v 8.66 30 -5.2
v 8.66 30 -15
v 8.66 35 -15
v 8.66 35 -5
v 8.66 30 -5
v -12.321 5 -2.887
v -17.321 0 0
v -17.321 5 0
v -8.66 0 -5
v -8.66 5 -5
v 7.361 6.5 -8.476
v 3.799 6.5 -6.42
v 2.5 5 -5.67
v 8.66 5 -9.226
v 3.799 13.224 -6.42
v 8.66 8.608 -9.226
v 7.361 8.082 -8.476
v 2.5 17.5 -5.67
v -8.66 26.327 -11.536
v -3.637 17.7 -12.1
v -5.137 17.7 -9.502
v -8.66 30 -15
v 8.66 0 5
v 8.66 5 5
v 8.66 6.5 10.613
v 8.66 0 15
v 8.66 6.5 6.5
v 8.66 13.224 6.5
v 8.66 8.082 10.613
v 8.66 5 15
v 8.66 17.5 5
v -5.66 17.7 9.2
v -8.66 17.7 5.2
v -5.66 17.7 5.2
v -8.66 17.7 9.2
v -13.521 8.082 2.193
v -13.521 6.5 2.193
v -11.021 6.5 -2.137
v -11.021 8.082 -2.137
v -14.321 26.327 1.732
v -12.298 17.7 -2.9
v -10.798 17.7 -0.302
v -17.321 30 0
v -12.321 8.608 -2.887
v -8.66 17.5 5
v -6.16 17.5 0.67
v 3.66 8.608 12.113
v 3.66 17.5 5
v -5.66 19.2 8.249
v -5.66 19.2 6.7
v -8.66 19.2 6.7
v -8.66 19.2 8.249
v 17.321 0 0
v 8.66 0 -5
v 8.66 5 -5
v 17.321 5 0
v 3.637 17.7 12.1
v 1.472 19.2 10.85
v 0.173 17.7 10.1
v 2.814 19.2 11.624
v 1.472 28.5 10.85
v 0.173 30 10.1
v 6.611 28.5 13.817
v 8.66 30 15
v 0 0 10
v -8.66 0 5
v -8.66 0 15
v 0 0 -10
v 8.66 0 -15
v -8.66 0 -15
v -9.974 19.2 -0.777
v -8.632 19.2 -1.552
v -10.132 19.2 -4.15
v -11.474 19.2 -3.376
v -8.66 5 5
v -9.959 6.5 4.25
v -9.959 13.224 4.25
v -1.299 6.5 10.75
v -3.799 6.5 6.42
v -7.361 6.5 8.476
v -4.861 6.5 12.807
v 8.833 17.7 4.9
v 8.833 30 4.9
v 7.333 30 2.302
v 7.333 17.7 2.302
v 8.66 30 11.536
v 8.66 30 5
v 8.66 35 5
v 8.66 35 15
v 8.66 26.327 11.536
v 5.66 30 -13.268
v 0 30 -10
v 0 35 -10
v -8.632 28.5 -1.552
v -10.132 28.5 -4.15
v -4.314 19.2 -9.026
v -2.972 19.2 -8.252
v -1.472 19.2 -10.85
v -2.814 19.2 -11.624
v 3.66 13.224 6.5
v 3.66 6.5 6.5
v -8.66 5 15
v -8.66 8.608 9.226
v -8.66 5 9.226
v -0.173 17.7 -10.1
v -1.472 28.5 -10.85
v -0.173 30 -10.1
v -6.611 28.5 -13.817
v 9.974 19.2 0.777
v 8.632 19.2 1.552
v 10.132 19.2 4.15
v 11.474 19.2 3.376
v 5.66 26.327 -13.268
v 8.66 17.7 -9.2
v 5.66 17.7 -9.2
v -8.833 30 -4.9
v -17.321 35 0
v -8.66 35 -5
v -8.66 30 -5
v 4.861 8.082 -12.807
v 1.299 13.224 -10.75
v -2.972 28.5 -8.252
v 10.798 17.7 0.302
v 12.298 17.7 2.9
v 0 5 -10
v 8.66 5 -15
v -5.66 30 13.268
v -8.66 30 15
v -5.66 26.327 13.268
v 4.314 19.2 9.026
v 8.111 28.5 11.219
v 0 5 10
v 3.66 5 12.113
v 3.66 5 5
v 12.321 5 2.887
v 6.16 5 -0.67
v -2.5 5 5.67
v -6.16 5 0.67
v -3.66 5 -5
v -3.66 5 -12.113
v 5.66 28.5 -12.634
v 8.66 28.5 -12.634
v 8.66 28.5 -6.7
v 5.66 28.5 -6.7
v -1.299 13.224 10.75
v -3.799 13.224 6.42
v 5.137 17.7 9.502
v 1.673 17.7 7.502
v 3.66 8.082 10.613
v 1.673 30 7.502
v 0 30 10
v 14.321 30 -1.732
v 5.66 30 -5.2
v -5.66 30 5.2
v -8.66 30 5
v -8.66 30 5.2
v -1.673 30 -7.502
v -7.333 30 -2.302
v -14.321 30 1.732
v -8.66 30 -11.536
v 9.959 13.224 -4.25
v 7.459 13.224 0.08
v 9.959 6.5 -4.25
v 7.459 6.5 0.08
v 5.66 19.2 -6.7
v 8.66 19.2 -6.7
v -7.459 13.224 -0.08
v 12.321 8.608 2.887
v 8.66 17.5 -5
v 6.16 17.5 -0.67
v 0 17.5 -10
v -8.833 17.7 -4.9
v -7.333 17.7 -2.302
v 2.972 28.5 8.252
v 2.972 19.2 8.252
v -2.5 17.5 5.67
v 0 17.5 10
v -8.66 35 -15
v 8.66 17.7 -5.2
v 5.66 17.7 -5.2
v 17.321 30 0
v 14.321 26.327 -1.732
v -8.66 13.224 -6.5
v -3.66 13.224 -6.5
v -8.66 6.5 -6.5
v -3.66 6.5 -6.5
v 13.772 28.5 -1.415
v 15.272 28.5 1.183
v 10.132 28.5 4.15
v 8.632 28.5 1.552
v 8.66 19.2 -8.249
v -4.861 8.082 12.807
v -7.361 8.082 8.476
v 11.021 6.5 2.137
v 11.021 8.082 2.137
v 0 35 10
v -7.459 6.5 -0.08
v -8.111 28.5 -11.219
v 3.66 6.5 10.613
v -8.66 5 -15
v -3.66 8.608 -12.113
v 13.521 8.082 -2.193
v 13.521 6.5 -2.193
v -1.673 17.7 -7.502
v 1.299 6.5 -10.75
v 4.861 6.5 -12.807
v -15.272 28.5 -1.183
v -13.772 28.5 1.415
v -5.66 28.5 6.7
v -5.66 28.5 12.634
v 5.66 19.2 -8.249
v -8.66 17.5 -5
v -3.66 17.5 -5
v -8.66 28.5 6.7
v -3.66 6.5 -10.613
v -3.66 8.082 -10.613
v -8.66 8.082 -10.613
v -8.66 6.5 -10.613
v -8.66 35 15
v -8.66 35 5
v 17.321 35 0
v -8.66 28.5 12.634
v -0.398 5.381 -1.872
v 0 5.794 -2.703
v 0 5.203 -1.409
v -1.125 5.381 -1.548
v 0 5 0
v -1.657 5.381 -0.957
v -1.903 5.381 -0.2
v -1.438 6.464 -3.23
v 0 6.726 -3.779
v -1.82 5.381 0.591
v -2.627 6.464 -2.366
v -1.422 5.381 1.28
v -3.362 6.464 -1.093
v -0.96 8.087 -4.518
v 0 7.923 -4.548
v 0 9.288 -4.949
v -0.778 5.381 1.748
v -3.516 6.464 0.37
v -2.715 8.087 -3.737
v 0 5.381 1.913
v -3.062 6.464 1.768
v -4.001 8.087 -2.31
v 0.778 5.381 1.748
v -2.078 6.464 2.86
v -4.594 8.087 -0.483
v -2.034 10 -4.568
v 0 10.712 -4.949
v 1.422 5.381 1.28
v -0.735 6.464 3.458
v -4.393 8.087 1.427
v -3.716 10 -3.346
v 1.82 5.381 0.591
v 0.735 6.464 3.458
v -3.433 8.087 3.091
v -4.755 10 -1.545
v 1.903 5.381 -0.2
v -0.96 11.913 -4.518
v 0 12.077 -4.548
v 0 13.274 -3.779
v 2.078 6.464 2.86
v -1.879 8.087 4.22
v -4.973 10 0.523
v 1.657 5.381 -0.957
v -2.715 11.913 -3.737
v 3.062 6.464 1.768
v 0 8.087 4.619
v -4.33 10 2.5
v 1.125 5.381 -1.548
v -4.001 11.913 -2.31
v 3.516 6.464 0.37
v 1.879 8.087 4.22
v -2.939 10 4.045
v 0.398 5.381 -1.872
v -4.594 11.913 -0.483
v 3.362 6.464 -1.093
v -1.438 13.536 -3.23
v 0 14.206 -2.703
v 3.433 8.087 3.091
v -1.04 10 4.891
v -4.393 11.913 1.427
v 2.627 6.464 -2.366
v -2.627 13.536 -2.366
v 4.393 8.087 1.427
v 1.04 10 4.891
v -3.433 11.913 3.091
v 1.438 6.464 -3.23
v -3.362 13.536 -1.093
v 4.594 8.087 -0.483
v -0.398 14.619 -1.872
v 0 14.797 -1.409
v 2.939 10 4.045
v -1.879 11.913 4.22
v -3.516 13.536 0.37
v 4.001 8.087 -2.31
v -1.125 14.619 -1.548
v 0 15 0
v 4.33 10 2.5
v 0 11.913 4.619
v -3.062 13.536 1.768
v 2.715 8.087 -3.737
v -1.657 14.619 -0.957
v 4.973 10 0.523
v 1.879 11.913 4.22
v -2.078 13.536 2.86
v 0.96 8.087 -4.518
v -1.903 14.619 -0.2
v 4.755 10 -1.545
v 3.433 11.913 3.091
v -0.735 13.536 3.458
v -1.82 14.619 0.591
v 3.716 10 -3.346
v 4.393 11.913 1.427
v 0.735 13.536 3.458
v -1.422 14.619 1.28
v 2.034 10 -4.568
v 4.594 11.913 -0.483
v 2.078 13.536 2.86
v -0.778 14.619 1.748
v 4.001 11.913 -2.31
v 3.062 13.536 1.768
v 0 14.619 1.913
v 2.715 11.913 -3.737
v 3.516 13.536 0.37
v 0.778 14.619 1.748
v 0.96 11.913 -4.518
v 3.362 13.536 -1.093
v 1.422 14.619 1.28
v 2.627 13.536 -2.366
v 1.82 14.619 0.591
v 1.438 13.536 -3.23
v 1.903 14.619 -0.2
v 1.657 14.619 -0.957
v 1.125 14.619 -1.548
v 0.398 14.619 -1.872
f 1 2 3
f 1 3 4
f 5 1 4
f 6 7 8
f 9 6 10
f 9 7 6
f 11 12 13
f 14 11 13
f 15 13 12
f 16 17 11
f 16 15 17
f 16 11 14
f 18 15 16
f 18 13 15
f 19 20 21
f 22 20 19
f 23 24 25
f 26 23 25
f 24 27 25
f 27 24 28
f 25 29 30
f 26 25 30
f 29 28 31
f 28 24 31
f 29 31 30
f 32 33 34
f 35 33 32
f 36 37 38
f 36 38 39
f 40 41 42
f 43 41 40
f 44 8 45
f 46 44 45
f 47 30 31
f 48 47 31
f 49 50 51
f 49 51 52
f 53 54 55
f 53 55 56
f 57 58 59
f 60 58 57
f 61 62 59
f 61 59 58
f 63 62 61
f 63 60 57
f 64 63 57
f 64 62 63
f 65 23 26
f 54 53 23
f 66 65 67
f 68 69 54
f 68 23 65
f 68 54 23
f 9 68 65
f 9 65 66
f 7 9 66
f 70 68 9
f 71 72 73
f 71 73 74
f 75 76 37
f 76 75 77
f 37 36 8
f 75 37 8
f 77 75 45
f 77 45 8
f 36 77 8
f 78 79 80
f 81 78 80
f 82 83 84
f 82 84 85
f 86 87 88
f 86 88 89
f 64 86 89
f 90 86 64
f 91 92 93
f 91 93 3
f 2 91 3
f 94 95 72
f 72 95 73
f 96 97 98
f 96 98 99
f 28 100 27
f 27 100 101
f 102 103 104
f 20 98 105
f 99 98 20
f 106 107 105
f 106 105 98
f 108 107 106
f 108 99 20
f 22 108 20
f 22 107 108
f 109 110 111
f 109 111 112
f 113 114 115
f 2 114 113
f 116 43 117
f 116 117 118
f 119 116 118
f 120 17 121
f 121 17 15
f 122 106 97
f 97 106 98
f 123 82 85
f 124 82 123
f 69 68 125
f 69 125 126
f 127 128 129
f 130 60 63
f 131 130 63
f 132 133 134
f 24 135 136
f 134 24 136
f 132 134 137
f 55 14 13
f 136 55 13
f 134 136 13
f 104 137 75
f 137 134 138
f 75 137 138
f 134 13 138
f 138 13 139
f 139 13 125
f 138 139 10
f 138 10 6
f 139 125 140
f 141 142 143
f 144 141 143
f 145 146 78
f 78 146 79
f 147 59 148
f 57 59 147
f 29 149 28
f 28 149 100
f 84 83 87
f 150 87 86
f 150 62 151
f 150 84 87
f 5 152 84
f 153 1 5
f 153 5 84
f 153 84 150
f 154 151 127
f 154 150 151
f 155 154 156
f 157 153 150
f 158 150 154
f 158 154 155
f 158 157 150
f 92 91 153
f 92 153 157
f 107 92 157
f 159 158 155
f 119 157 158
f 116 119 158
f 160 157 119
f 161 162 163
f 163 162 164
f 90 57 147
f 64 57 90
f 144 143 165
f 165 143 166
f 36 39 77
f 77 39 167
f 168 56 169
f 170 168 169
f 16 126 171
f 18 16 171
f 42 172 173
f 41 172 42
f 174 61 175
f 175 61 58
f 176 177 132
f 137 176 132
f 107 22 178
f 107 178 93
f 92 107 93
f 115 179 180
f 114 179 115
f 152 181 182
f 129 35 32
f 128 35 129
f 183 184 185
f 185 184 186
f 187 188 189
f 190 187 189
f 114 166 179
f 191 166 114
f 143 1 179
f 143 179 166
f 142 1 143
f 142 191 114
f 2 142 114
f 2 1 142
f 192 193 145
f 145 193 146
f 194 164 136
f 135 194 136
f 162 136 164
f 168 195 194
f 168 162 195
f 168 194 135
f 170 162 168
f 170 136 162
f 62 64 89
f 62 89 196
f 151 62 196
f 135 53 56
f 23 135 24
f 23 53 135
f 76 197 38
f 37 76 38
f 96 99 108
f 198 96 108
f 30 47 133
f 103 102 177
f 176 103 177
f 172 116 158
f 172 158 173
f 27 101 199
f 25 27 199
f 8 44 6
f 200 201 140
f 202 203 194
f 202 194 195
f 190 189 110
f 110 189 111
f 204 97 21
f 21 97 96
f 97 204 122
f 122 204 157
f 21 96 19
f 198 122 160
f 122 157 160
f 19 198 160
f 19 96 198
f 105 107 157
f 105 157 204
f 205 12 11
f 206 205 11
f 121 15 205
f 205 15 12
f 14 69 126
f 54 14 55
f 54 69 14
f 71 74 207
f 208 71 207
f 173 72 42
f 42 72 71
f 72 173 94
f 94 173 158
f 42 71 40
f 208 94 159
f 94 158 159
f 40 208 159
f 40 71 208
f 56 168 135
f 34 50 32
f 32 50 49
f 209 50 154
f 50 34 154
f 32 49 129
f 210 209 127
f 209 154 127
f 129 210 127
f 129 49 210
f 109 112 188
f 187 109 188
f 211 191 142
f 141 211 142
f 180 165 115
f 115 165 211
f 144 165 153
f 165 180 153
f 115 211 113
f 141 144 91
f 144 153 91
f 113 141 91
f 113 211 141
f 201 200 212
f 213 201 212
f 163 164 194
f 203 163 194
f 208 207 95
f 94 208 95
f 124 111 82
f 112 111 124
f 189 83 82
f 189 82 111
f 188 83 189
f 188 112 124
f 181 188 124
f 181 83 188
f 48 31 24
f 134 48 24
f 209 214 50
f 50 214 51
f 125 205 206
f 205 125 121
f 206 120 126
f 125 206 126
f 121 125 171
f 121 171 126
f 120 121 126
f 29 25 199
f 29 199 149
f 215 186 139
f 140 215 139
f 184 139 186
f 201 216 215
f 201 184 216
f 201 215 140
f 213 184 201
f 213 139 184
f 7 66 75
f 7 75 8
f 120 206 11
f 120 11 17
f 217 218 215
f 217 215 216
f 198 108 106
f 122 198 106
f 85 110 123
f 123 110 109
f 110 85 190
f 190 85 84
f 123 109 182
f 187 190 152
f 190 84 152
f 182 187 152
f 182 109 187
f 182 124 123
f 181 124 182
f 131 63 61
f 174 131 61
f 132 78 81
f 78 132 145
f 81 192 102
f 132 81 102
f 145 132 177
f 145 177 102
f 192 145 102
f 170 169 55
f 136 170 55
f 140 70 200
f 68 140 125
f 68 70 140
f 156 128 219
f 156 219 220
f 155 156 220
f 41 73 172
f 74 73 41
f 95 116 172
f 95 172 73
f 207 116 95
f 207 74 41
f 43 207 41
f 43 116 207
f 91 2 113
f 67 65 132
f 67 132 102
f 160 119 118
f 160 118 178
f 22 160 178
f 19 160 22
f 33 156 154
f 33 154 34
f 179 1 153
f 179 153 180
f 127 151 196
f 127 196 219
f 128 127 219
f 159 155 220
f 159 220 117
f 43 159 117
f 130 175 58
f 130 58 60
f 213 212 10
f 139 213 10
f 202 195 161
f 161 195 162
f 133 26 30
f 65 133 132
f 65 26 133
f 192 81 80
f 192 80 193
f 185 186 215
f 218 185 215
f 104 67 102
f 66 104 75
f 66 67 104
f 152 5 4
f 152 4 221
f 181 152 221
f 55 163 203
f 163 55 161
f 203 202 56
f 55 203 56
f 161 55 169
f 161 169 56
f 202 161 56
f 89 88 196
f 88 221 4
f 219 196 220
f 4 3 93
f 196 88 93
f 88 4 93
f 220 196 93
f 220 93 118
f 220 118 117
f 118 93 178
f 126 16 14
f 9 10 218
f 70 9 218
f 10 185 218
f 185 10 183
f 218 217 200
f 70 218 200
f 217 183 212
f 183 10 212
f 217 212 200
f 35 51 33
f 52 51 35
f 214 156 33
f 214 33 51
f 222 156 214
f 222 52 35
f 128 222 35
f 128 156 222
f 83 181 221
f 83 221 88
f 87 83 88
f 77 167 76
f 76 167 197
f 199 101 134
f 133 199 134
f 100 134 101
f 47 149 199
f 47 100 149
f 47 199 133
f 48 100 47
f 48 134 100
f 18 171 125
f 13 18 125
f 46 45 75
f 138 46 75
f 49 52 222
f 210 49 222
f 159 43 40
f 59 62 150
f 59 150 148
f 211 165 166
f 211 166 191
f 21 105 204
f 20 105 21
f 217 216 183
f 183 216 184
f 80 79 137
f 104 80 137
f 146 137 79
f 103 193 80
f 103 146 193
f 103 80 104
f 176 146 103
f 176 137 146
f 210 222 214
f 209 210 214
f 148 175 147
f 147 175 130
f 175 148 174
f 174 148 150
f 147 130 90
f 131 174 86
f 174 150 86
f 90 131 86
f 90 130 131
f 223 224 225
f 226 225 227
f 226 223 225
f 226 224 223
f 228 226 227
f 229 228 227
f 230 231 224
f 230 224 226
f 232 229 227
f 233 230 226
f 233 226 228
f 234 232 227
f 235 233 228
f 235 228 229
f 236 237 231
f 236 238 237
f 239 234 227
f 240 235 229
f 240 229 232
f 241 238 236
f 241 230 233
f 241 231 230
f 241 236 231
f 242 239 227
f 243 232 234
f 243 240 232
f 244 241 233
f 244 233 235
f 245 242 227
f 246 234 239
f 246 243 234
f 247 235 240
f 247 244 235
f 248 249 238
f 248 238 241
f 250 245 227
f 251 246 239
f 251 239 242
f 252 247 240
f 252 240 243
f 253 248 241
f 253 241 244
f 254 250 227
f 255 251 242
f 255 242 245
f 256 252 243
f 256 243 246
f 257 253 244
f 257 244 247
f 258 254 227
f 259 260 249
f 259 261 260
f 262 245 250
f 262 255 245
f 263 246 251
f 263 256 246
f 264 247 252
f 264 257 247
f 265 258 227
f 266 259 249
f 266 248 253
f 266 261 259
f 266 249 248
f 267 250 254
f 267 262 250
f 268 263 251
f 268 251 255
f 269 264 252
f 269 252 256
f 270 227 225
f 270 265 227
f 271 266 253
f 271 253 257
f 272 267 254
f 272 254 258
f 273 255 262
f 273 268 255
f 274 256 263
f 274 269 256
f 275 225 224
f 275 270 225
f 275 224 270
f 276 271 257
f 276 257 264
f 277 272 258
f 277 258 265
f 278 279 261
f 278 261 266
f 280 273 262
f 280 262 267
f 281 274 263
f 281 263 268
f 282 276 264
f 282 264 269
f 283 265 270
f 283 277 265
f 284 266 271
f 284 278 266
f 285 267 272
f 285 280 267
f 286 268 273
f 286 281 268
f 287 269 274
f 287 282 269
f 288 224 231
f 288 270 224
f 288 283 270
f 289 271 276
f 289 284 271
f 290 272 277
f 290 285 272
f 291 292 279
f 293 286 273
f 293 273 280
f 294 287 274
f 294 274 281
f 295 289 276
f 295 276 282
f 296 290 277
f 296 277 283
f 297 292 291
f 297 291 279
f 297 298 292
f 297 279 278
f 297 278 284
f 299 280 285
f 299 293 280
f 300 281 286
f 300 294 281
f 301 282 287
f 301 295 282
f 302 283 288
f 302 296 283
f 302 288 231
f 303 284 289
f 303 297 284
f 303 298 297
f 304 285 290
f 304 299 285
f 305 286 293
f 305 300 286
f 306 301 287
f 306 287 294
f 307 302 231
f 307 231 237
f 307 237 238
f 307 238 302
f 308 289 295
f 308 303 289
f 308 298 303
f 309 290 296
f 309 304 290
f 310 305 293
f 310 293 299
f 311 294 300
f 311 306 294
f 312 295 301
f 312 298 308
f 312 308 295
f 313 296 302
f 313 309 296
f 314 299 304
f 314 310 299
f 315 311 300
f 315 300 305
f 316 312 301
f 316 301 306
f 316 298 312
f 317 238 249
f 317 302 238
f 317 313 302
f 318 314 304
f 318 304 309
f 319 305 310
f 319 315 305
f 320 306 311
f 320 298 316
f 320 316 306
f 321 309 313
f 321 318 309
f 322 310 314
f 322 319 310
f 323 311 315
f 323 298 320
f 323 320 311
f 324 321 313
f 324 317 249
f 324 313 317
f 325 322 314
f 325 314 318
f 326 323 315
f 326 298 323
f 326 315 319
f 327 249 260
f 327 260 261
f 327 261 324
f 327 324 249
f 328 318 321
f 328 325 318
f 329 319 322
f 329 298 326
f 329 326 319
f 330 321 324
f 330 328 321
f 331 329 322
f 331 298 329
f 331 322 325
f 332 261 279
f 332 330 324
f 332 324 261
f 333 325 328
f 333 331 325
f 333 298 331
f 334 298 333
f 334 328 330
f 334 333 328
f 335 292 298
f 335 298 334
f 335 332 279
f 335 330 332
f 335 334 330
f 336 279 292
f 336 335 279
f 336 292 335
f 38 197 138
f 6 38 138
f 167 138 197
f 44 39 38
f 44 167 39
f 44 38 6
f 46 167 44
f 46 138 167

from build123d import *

# Parameters (mm, degrees)
BOSS_EXTRUDE1_DEPTH = 5
BOSS_EXTRUDE2_START = 30
BOSS_EXTRUDE2_DEPTH = 5
BOSS_EXTRUDE3_DEPTH = 5
CIRPATTERN3_COUNT   = 6
SKETCH6_W           = 10
SKETCH6_H           = 17.5
CUT_EXTRUDE2_DEPTH  = 5
CIRPATTERN4_COUNT   = 6
CUT_EXTRUDE3_DEPTH  = 5
CIRPATTERN5_COUNT   = 6
BOSS_EXTRUDE4_DEPTH = 3
CIRPATTERN6_COUNT   = 6
SKETCH9_W           = 6.930095711
SKETCH9_H           = 11.997305441
CUT_EXTRUDE4_DEPTH  = 3
CIRPATTERN7_COUNT   = 6


with BuildPart() as part:
    # Sketch2 → Boss-Extrude1 (new body)
    with BuildSketch(Plane(origin=(0, 0, 0), x_dir=(1, 0, 0), z_dir=(0, 1, 0))):
        Polygon((8.660254038, -15), (0, -10), (0, 0), (8.660254038, -5), align=None)
        Polygon((-8.660254038, -15), (-8.660254038, -5), (0, 0), (0, -10), align=None)
        Polygon((-17.320508076, 0), (-8.660254038, 5), (0, 0), (-8.660254038, -5), align=None)
        Polygon((0, 10), (0, 0), (-8.660254038, 5), (-8.660254038, 15), align=None)
        Polygon((8.660254038, 15), (8.660254038, 5), (0, 0), (0, 10), align=None)
        Polygon((17.320508076, 0), (8.660254038, -5), (0, 0), (8.660254038, 5), align=None)
    extrude(amount=BOSS_EXTRUDE1_DEPTH)

    # Sketch3 → Boss-Extrude3 (add)
    with BuildSketch(Plane.ZY.offset(8.660254038)):
        Polygon((-15, 5), (-5, 17.5), (-5, 5), align=None)
    boss_extrude3 = extrude(amount=-BOSS_EXTRUDE3_DEPTH)

    # CirPattern3: Boss-Extrude3 ×6 about axis
    cirpattern3_axis = Axis((0, 0, 0), (0, 1, 0))
    for i in range(1, CIRPATTERN3_COUNT):
        add(boss_extrude3.rotate(cirpattern3_axis, i * 360 / CIRPATTERN3_COUNT))

    # Sketch6 → Cut-Extrude2 (cut)
    with BuildSketch(Plane(origin=(4.330127019, 0, -7.5), x_dir=(-0.866025404, 0, -0.5), z_dir=(0.5, 0, -0.866025404))):
        with Locations((10, 8.75)):
            Rectangle(SKETCH6_W, SKETCH6_H)
    cut_extrude2 = extrude(amount=CUT_EXTRUDE2_DEPTH, mode=Mode.SUBTRACT)

    # CirPattern4: Cut-Extrude2 ×6 about axis
    cirpattern4_axis = Axis((0, 0, 0), (0, 1, 0))
    for i in range(1, CIRPATTERN4_COUNT):
        add(cut_extrude2.rotate(cirpattern4_axis, i * 360 / CIRPATTERN4_COUNT), mode=Mode.SUBTRACT)

    # Sketch7 → Cut-Extrude3 (cut)
    with BuildSketch(Plane(origin=(-1.830127019, 0, -3.169872981), x_dir=(0.866025404, 0, -0.5), z_dir=(0.5, 0, 0.866025404))):
        Polygon((10.613248654, 6.5), (10.613248654, 8.082267593), (6.5, 13.223828411), (6.5, 6.5), align=None)
    cut_extrude3 = extrude(amount=-CUT_EXTRUDE3_DEPTH, mode=Mode.SUBTRACT)

    # CirPattern5: Cut-Extrude3 ×6 about axis
    cirpattern5_axis = Axis((0, 0, 0), (0, 1, 0))
    for i in range(1, CIRPATTERN5_COUNT):
        add(cut_extrude3.rotate(cirpattern5_axis, i * 360 / CIRPATTERN5_COUNT), mode=Mode.SUBTRACT)


with BuildPart() as body_2:
    # Sketch2_3 → Boss-Extrude2 (new body)
    with BuildSketch(Plane(origin=(0, 0, 0), x_dir=(1, 0, 0), z_dir=(0, 1, 0)).offset(BOSS_EXTRUDE2_START)):
        Polygon((-8.660254038, 5), (-8.660254038, 15), (0, 10), (8.660254038, 15), (8.660254038, 5), (17.320508076, 0), (8.660254038, -5), (8.660254038, -15), (0, -10), (-8.660254038, -15), (-8.660254038, -5), (-17.320508076, 0), align=None)
    extrude(amount=BOSS_EXTRUDE2_DEPTH)

    # Sketch8 → Boss-Extrude4 (add)
    with BuildSketch(Plane(origin=(4.330127019, 0, -7.5), x_dir=(-0.866025404, 0, -0.5), z_dir=(0.5, 0, -0.866025404))):
        Polygon((15, 30), (5.2, 30), (5.2, 17.7), (9.2, 17.7), align=None)
        Polygon((8.248914998, 19.2), (12.634280852, 28.5), (6.7, 28.5), (6.7, 19.2), align=None, mode=Mode.SUBTRACT)
    boss_extrude4 = extrude(amount=-BOSS_EXTRUDE4_DEPTH)

    # CirPattern6: Boss-Extrude4 ×6 about axis
    cirpattern6_axis = Axis((0, 0, 0), (0, 1, 0))
    for i in range(1, CIRPATTERN6_COUNT):
        add(boss_extrude4.rotate(cirpattern6_axis, i * 360 / CIRPATTERN6_COUNT))

    # Sketch9 → Cut-Extrude4 (cut)
    with BuildSketch(Plane.ZY.offset(8.660254038)):
        with Locations((-11.534952145, 29.00134728)):
            Rectangle(SKETCH9_W, SKETCH9_H)
    cut_extrude4 = extrude(amount=CUT_EXTRUDE4_DEPTH, mode=Mode.SUBTRACT)

    # CirPattern7: Cut-Extrude4 ×6 about axis
    cirpattern7_axis = Axis((0, 0, 0), (0, 1, 0))
    for i in range(1, CIRPATTERN7_COUNT):
        add(cut_extrude4.rotate(cirpattern7_axis, i * 360 / CIRPATTERN7_COUNT), mode=Mode.SUBTRACT)


with BuildPart() as body_3:
    # Sketch4 → Revolve11 (revolve)
    with BuildSketch(Plane(origin=(0, 0, 0), x_dir=(0, 0, -1), z_dir=(1, 0, 0))):
        with BuildLine():
            Line((0, 15), (0, 5))
            ThreePointArc((0, 5), (5, 10), (0, 15))
        make_face()
    revolve(axis=Axis((0, 0, 0), (0, 1, 0)))


solid = Compound([part.part, body_2.part, body_3.part])
